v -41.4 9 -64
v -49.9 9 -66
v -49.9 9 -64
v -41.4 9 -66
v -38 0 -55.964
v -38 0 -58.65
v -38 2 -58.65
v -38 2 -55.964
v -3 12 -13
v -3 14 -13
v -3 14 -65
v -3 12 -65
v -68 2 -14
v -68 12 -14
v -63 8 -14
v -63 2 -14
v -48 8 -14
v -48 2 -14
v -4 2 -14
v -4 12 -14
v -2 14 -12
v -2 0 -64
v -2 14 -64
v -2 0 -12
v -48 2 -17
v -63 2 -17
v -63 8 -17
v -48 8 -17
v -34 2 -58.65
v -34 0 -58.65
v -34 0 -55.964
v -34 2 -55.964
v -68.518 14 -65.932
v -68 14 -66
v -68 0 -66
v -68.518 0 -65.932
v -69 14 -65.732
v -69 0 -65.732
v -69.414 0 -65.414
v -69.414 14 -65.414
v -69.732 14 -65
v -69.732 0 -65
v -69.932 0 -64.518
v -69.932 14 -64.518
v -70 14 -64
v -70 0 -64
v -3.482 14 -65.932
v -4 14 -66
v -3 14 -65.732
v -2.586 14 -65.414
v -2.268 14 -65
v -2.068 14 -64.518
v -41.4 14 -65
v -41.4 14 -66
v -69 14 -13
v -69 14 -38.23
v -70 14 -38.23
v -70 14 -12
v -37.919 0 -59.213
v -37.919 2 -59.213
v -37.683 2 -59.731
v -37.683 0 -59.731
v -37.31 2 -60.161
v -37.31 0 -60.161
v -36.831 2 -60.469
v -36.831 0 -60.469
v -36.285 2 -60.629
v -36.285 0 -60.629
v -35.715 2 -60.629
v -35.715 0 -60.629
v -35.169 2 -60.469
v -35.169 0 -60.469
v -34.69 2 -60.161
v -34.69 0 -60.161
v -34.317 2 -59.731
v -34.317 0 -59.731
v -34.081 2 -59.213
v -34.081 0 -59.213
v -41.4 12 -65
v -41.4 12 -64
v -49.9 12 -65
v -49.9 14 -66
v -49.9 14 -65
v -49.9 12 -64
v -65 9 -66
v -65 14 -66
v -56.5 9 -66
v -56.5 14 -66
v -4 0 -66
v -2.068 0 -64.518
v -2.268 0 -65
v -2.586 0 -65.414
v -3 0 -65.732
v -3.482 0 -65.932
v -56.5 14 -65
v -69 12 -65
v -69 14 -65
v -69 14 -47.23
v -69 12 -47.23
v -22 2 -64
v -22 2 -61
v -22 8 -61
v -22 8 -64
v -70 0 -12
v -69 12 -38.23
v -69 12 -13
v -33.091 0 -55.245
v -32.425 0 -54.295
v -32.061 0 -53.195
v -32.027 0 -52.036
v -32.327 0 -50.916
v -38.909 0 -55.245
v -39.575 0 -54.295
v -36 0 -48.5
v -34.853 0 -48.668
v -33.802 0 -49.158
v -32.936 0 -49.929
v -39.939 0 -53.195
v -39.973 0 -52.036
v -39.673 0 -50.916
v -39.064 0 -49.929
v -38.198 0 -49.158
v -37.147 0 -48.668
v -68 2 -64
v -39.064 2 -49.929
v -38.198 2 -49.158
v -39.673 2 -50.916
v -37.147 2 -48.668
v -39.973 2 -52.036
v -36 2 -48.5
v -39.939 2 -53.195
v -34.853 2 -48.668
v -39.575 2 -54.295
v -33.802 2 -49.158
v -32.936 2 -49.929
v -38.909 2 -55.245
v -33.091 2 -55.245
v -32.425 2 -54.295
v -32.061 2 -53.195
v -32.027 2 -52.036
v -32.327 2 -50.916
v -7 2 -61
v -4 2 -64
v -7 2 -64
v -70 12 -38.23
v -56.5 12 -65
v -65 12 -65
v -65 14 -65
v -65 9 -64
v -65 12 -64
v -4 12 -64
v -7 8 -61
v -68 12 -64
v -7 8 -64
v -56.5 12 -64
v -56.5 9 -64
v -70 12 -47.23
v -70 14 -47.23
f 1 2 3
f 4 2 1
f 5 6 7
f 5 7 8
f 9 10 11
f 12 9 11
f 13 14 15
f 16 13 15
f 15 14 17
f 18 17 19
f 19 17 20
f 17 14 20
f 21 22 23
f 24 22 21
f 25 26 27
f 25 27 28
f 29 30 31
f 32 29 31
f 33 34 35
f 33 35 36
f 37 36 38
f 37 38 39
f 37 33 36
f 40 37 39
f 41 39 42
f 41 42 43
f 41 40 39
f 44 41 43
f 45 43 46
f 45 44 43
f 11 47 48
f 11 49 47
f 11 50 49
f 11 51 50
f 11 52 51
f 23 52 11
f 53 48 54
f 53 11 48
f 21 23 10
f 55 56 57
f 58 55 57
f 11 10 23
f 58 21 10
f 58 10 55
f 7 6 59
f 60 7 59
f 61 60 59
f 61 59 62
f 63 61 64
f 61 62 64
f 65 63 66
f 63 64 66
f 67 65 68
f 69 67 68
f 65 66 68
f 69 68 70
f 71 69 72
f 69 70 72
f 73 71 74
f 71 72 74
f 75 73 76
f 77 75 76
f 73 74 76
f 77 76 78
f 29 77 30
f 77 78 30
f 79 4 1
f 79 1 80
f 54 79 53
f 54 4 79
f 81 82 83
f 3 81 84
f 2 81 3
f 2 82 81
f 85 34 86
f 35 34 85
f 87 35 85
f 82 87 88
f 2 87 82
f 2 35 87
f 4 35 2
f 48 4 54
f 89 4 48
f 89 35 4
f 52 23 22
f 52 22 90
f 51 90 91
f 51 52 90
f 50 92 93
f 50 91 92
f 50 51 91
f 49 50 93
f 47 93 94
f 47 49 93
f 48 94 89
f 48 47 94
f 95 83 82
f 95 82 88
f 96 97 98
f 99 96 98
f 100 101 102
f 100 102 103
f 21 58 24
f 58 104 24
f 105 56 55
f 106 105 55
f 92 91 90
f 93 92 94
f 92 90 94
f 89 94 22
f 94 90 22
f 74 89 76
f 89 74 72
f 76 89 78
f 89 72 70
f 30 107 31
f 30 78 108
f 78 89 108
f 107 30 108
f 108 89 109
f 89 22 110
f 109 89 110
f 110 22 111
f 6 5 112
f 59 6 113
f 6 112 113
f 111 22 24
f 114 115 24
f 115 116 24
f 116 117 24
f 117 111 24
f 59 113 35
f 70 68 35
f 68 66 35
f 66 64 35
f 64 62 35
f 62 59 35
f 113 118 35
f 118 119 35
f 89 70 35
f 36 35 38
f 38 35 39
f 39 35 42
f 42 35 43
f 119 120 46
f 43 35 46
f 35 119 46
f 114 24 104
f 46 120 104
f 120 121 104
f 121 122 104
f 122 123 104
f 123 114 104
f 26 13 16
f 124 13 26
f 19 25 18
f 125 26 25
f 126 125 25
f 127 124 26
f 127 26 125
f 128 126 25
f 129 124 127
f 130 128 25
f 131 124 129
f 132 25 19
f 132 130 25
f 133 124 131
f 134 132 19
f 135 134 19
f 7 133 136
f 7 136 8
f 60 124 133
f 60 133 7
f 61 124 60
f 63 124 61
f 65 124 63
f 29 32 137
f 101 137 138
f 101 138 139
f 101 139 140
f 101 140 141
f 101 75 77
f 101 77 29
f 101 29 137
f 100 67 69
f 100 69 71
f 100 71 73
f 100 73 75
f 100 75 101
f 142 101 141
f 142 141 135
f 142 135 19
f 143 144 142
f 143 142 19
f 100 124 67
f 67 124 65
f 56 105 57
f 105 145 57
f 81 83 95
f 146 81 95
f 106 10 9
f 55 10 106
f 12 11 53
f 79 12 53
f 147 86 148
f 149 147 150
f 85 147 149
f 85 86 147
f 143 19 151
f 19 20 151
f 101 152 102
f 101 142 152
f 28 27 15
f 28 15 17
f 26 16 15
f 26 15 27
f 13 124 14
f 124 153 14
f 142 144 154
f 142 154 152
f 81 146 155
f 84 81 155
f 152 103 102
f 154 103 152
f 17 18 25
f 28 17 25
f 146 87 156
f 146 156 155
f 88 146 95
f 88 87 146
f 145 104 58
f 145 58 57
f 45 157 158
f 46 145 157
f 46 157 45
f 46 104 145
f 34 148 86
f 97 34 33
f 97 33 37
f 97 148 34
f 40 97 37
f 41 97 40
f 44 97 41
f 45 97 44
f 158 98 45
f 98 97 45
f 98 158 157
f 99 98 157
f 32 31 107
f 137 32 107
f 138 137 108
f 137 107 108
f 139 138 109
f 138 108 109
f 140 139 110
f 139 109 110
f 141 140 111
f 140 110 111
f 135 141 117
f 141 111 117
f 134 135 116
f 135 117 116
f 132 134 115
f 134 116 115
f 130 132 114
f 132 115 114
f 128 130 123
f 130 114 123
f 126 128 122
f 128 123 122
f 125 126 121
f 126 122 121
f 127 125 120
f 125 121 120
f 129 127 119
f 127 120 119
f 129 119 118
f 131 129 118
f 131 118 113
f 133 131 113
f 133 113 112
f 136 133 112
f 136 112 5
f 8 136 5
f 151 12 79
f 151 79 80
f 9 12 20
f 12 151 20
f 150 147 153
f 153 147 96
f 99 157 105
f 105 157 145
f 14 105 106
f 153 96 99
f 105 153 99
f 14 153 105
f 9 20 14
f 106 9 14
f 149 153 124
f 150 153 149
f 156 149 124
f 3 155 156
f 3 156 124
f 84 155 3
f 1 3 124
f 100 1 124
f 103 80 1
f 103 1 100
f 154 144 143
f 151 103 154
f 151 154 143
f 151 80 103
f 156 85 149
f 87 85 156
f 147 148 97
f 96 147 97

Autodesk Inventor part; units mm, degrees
ref_plane "YZ Plane" through (0, 0, 0) normal (1, 0, 0) x (0, 1, 0)
ref_plane "XZ Plane" through (0, 0, 0) normal (0, 1, 0) x (-1, 0, 0)
ref_plane "XY Plane" through (0, 0, 0) normal (0, 0, 1) x (1, 0, 0)
sketch "Sketch1" plane through (0, 0, 0) normal (0, 1, 0) x (-1, 0, 0)
  point P0 (0, 0)
sketch "Sketch2" plane through (0, 0, 0) normal (0, 1, 0) x (-1, 0, 0)
  line L0 (70, -12) -> (70, -66)
  line L1 (70, -66) -> (2, -66)
  line L2 (70, -12) -> (2, -12)
  line L3 (2, -66) -> (2, -12)
  point P0 (0, 0)
  point P1 (2, 0)
  dimension "d151" = 68
  dimension "d152" = 54
extrude "Extrusion1" add sketch "Sketch2" along normal blind 14
sketch "Sketch3" plane through (0, 14, 0) normal (0, 1, 0) x (1, 0, 0)
  point P0 (0, 0)
sketch "Sketch4" plane through (0, 14, 0) normal (0, 1, 0) x (1, 0, 0)
  line L0 (-2, 66) -> (-70, 66) projected
  line L1 (-30.4814, 66) -> (-28.4814, 66)
  line L2 (-28.4814, 66) -> (-28.4814, 64)
  line L3 (-70, 66) -> (-70, 12) projected
  line L4 (-70, 37.8423) -> (-70, 39.8423)
  line L5 (-70, 39.8423) -> (-68, 39.8423)
  line L6 (-68, 64) -> (-68, 14)
  line L7 (-68, 64) -> (-4, 64)
  line L8 (-68, 14) -> (-4, 14)
  line L9 (-4, 14) -> (-4, 64)
  line L10 (-70, 12) -> (-2, 12) projected
  line L11 (-2, 12) -> (-2, 66) projected
  point P0 (-2, 64)
  point P1 (-68, 12)
  dimension "d6" = 2
  dimension "d8" = 2
  dimension "d102" = 2
  dimension "d104" = 2
  dimension "d153" = 2
  dimension "d154" = 2
extrude "Extrusion2" cut sketch "Sketch4" against normal blind 12 contours L7 L9 L8 L6
sketch "Sketch10" plane through (0, 2, 0) normal (0, 1, 0) x (1, 0, 0)
  line L0 (-48, 14) -> (-48, 17)
  line L1 (-48, 14) -> (-63, 14)
  line L2 (-63, 14) -> (-63, 17)
  line L3 (-63, 17) -> (-48, 17)
  line L4 (-48, 17) -> (-48, 14)
  line L5 (-22, 64) -> (-7, 64)
  line L6 (-7, 64) -> (-7, 61)
  line L7 (-7, 61) -> (-22, 61)
  line L8 (-22, 61) -> (-22, 64)
  line L9 (-68, 64) -> (-4, 64) projected
  line L10 (-63, 14) -> (-48, 14)
  line L11 (-4, 14) -> (-68, 14) projected
  point P0 (-68, 2)
  point P1 (-2, 64)
  dimension "d55" = 3
  dimension "d56" = 15
  dimension "d60" = 15
  dimension "d108" = 3
  dimension "d155" = 0
extrude "Extrusion5" add sketch "Sketch10" along normal blind 6
sketch "Sketch12" plane through (0, 0, 0) normal (0, -1, 0) x (1, 0, 0)
  line L0 (0, 0) -> (0, -66) projected
  arc A0 (-34, -55.9641) -> (-34, -49.0359) centre (-36, -52.5) ccw
  arc A1 (-38, -58.6498) -> (-34, -58.6498) centre (-36, -58.6498) ccw
  line L1 (-34, -58.6498) -> (-34, -55.9641)
  line L2 (-38, -58.6498) -> (-38, -55.9641)
  arc A2 (-34, -49.0359) -> (-38, -55.9641) centre (-36, -52.5) ccw
  line L3 (-2, -12) -> (-2, -66) projected
  line L4 (-2, -66) -> (-70, -66) projected
  line L5 (-2, -66) -> (-70, -66)
  line L6 (-36, -66) -> (-36, -12)
  line L7 (-70, -66) -> (-70, -12) projected
  line L8 (-70, -66) -> (-70, -12)
  line L9 (-70, -39) -> (-2, -39)
  line L10 (-36, -39) -> (-36, -66)
  line L11 (-36, -52.5) -> (-2, -52.5)
  arc A3 (-39, -58.6498) -> (-33, -58.6498) centre (-36, -58.6498) ccw
  line L12 (-39, -58.6498) -> (-39, -56.5)
  arc A4 (-33.5, -48.1699) -> (-39, -56.5) centre (-36, -52.5) ccw
  arc A5 (-33, -56.5) -> (-33.5, -48.1699) centre (-36, -52.5) ccw
  line L13 (-33, -56.5) -> (-33, -58.6498)
  dimension "d156" = 34
  dimension "d157" = 1
extrude "Extrusion7" cut sketch "Sketch12" against normal blind 5 contours L1 A1 L6 L11 A0 | L11 L6 A2 A0 | L6 A1 L2 A2
sketch "Sketch13" plane through (0, 14, 0) normal (0, 1, 0) x (1, 0, 0)
  line L0 (-70, 66) -> (-70, 12) projected
  line L1 (-69, 65) -> (-69, 13)
  line L2 (-2, 66) -> (-70, 66) projected
  line L3 (-68, 64) -> (-4, 64)
  line L4 (-2, 64) -> (-2, 12)
  line L5 (-68, 14) -> (-68, 64)
  line L6 (-4, 14) -> (-68, 14) projected
  line L7 (-68, 14) -> (-4, 14)
  line L8 (-7, 64) -> (-4, 64) projected
  line L9 (-4, 14) -> (-4, 64)
  line L10 (-70, 12) -> (-2, 12) projected
  line L11 (-68, 13) -> (-69, 13)
  line L12 (-68, 13) -> (-3, 13)
  line L13 (-2, 12) -> (-2, 66) projected
  line L14 (-4, 13) -> (-3, 13)
  line L15 (-3, 13) -> (-3, 64)
  line L16 (-3, 64) -> (-3, 65)
  line L17 (-3, 65) -> (-69, 65)
  dimension "d96" = 1
  dimension "d99" = 1
extrude "Extrusion8" cut sketch "Sketch13" against normal blind 2 contours L17 L16 L15 L12 L11 L1 | L3 L9 L6 L5
sketch "Sketch15" plane through (-70, 0, -66) normal (-1, 0, 0) x (0, 0, 1)
  line L0 (62.4242, 8) -> (52.7396, 8)
  line L1 (0, 0) -> (66, 0) projected
  line L2 (0, 14) -> (54, 14) projected
  line L3 (0, 0) -> (0, 14) projected
  line L4 (18.77, 12) -> (27.77, 12)
  line L5 (27.77, 12) -> (27.77, 17)
  line L6 (27.77, 17) -> (18.77, 17)
  line L7 (18.77, 17) -> (18.77, 12)
  point P0 (66, 14)
  dimension "d118" = 8
  dimension "d140" = 27.77
  dimension "d141" = 9
  dimension "d143" = 5
  dimension "d150" = 4
extrude "Extrusion9" cut sketch "Sketch15" against normal blind 10
sketch "Sketch16" plane through (-2, 0, -66) normal (0, 0, -1) x (-1, 0, 0)
  line L0 (39.4, 14) -> (47.9, 14)
  line L1 (47.9, 14) -> (47.9, 9)
  line L2 (47.9, 9) -> (39.4, 9)
  line L3 (39.4, 9) -> (39.4, 14)
  line L4 (54.5, 14) -> (63, 14)
  line L5 (63, 14) -> (63, 9)
  line L6 (63, 9) -> (54.5, 9)
  line L7 (54.5, 9) -> (54.5, 14)
  line L8 (20, 8) -> (5, 8) projected
  line L9 (68, 0) -> (68, 14) projected
  point P0 (-2, 0)
  dimension "d127" = 8.5
  dimension "d128" = 8.5
  dimension "d131" = 28.6
  dimension "d132" = 13.5
  dimension "d148" = 5
  dimension "d149" = 6
extrude "Extrusion10" cut sketch "Sketch16" against normal blind 10
fillet "Fillet7" radius 2 1 edges at (-2, 7, -66)
fillet "Fillet8" radius 2 1 edges at (-70, 7, -66)
properties part number "Shell 3 bottom"
